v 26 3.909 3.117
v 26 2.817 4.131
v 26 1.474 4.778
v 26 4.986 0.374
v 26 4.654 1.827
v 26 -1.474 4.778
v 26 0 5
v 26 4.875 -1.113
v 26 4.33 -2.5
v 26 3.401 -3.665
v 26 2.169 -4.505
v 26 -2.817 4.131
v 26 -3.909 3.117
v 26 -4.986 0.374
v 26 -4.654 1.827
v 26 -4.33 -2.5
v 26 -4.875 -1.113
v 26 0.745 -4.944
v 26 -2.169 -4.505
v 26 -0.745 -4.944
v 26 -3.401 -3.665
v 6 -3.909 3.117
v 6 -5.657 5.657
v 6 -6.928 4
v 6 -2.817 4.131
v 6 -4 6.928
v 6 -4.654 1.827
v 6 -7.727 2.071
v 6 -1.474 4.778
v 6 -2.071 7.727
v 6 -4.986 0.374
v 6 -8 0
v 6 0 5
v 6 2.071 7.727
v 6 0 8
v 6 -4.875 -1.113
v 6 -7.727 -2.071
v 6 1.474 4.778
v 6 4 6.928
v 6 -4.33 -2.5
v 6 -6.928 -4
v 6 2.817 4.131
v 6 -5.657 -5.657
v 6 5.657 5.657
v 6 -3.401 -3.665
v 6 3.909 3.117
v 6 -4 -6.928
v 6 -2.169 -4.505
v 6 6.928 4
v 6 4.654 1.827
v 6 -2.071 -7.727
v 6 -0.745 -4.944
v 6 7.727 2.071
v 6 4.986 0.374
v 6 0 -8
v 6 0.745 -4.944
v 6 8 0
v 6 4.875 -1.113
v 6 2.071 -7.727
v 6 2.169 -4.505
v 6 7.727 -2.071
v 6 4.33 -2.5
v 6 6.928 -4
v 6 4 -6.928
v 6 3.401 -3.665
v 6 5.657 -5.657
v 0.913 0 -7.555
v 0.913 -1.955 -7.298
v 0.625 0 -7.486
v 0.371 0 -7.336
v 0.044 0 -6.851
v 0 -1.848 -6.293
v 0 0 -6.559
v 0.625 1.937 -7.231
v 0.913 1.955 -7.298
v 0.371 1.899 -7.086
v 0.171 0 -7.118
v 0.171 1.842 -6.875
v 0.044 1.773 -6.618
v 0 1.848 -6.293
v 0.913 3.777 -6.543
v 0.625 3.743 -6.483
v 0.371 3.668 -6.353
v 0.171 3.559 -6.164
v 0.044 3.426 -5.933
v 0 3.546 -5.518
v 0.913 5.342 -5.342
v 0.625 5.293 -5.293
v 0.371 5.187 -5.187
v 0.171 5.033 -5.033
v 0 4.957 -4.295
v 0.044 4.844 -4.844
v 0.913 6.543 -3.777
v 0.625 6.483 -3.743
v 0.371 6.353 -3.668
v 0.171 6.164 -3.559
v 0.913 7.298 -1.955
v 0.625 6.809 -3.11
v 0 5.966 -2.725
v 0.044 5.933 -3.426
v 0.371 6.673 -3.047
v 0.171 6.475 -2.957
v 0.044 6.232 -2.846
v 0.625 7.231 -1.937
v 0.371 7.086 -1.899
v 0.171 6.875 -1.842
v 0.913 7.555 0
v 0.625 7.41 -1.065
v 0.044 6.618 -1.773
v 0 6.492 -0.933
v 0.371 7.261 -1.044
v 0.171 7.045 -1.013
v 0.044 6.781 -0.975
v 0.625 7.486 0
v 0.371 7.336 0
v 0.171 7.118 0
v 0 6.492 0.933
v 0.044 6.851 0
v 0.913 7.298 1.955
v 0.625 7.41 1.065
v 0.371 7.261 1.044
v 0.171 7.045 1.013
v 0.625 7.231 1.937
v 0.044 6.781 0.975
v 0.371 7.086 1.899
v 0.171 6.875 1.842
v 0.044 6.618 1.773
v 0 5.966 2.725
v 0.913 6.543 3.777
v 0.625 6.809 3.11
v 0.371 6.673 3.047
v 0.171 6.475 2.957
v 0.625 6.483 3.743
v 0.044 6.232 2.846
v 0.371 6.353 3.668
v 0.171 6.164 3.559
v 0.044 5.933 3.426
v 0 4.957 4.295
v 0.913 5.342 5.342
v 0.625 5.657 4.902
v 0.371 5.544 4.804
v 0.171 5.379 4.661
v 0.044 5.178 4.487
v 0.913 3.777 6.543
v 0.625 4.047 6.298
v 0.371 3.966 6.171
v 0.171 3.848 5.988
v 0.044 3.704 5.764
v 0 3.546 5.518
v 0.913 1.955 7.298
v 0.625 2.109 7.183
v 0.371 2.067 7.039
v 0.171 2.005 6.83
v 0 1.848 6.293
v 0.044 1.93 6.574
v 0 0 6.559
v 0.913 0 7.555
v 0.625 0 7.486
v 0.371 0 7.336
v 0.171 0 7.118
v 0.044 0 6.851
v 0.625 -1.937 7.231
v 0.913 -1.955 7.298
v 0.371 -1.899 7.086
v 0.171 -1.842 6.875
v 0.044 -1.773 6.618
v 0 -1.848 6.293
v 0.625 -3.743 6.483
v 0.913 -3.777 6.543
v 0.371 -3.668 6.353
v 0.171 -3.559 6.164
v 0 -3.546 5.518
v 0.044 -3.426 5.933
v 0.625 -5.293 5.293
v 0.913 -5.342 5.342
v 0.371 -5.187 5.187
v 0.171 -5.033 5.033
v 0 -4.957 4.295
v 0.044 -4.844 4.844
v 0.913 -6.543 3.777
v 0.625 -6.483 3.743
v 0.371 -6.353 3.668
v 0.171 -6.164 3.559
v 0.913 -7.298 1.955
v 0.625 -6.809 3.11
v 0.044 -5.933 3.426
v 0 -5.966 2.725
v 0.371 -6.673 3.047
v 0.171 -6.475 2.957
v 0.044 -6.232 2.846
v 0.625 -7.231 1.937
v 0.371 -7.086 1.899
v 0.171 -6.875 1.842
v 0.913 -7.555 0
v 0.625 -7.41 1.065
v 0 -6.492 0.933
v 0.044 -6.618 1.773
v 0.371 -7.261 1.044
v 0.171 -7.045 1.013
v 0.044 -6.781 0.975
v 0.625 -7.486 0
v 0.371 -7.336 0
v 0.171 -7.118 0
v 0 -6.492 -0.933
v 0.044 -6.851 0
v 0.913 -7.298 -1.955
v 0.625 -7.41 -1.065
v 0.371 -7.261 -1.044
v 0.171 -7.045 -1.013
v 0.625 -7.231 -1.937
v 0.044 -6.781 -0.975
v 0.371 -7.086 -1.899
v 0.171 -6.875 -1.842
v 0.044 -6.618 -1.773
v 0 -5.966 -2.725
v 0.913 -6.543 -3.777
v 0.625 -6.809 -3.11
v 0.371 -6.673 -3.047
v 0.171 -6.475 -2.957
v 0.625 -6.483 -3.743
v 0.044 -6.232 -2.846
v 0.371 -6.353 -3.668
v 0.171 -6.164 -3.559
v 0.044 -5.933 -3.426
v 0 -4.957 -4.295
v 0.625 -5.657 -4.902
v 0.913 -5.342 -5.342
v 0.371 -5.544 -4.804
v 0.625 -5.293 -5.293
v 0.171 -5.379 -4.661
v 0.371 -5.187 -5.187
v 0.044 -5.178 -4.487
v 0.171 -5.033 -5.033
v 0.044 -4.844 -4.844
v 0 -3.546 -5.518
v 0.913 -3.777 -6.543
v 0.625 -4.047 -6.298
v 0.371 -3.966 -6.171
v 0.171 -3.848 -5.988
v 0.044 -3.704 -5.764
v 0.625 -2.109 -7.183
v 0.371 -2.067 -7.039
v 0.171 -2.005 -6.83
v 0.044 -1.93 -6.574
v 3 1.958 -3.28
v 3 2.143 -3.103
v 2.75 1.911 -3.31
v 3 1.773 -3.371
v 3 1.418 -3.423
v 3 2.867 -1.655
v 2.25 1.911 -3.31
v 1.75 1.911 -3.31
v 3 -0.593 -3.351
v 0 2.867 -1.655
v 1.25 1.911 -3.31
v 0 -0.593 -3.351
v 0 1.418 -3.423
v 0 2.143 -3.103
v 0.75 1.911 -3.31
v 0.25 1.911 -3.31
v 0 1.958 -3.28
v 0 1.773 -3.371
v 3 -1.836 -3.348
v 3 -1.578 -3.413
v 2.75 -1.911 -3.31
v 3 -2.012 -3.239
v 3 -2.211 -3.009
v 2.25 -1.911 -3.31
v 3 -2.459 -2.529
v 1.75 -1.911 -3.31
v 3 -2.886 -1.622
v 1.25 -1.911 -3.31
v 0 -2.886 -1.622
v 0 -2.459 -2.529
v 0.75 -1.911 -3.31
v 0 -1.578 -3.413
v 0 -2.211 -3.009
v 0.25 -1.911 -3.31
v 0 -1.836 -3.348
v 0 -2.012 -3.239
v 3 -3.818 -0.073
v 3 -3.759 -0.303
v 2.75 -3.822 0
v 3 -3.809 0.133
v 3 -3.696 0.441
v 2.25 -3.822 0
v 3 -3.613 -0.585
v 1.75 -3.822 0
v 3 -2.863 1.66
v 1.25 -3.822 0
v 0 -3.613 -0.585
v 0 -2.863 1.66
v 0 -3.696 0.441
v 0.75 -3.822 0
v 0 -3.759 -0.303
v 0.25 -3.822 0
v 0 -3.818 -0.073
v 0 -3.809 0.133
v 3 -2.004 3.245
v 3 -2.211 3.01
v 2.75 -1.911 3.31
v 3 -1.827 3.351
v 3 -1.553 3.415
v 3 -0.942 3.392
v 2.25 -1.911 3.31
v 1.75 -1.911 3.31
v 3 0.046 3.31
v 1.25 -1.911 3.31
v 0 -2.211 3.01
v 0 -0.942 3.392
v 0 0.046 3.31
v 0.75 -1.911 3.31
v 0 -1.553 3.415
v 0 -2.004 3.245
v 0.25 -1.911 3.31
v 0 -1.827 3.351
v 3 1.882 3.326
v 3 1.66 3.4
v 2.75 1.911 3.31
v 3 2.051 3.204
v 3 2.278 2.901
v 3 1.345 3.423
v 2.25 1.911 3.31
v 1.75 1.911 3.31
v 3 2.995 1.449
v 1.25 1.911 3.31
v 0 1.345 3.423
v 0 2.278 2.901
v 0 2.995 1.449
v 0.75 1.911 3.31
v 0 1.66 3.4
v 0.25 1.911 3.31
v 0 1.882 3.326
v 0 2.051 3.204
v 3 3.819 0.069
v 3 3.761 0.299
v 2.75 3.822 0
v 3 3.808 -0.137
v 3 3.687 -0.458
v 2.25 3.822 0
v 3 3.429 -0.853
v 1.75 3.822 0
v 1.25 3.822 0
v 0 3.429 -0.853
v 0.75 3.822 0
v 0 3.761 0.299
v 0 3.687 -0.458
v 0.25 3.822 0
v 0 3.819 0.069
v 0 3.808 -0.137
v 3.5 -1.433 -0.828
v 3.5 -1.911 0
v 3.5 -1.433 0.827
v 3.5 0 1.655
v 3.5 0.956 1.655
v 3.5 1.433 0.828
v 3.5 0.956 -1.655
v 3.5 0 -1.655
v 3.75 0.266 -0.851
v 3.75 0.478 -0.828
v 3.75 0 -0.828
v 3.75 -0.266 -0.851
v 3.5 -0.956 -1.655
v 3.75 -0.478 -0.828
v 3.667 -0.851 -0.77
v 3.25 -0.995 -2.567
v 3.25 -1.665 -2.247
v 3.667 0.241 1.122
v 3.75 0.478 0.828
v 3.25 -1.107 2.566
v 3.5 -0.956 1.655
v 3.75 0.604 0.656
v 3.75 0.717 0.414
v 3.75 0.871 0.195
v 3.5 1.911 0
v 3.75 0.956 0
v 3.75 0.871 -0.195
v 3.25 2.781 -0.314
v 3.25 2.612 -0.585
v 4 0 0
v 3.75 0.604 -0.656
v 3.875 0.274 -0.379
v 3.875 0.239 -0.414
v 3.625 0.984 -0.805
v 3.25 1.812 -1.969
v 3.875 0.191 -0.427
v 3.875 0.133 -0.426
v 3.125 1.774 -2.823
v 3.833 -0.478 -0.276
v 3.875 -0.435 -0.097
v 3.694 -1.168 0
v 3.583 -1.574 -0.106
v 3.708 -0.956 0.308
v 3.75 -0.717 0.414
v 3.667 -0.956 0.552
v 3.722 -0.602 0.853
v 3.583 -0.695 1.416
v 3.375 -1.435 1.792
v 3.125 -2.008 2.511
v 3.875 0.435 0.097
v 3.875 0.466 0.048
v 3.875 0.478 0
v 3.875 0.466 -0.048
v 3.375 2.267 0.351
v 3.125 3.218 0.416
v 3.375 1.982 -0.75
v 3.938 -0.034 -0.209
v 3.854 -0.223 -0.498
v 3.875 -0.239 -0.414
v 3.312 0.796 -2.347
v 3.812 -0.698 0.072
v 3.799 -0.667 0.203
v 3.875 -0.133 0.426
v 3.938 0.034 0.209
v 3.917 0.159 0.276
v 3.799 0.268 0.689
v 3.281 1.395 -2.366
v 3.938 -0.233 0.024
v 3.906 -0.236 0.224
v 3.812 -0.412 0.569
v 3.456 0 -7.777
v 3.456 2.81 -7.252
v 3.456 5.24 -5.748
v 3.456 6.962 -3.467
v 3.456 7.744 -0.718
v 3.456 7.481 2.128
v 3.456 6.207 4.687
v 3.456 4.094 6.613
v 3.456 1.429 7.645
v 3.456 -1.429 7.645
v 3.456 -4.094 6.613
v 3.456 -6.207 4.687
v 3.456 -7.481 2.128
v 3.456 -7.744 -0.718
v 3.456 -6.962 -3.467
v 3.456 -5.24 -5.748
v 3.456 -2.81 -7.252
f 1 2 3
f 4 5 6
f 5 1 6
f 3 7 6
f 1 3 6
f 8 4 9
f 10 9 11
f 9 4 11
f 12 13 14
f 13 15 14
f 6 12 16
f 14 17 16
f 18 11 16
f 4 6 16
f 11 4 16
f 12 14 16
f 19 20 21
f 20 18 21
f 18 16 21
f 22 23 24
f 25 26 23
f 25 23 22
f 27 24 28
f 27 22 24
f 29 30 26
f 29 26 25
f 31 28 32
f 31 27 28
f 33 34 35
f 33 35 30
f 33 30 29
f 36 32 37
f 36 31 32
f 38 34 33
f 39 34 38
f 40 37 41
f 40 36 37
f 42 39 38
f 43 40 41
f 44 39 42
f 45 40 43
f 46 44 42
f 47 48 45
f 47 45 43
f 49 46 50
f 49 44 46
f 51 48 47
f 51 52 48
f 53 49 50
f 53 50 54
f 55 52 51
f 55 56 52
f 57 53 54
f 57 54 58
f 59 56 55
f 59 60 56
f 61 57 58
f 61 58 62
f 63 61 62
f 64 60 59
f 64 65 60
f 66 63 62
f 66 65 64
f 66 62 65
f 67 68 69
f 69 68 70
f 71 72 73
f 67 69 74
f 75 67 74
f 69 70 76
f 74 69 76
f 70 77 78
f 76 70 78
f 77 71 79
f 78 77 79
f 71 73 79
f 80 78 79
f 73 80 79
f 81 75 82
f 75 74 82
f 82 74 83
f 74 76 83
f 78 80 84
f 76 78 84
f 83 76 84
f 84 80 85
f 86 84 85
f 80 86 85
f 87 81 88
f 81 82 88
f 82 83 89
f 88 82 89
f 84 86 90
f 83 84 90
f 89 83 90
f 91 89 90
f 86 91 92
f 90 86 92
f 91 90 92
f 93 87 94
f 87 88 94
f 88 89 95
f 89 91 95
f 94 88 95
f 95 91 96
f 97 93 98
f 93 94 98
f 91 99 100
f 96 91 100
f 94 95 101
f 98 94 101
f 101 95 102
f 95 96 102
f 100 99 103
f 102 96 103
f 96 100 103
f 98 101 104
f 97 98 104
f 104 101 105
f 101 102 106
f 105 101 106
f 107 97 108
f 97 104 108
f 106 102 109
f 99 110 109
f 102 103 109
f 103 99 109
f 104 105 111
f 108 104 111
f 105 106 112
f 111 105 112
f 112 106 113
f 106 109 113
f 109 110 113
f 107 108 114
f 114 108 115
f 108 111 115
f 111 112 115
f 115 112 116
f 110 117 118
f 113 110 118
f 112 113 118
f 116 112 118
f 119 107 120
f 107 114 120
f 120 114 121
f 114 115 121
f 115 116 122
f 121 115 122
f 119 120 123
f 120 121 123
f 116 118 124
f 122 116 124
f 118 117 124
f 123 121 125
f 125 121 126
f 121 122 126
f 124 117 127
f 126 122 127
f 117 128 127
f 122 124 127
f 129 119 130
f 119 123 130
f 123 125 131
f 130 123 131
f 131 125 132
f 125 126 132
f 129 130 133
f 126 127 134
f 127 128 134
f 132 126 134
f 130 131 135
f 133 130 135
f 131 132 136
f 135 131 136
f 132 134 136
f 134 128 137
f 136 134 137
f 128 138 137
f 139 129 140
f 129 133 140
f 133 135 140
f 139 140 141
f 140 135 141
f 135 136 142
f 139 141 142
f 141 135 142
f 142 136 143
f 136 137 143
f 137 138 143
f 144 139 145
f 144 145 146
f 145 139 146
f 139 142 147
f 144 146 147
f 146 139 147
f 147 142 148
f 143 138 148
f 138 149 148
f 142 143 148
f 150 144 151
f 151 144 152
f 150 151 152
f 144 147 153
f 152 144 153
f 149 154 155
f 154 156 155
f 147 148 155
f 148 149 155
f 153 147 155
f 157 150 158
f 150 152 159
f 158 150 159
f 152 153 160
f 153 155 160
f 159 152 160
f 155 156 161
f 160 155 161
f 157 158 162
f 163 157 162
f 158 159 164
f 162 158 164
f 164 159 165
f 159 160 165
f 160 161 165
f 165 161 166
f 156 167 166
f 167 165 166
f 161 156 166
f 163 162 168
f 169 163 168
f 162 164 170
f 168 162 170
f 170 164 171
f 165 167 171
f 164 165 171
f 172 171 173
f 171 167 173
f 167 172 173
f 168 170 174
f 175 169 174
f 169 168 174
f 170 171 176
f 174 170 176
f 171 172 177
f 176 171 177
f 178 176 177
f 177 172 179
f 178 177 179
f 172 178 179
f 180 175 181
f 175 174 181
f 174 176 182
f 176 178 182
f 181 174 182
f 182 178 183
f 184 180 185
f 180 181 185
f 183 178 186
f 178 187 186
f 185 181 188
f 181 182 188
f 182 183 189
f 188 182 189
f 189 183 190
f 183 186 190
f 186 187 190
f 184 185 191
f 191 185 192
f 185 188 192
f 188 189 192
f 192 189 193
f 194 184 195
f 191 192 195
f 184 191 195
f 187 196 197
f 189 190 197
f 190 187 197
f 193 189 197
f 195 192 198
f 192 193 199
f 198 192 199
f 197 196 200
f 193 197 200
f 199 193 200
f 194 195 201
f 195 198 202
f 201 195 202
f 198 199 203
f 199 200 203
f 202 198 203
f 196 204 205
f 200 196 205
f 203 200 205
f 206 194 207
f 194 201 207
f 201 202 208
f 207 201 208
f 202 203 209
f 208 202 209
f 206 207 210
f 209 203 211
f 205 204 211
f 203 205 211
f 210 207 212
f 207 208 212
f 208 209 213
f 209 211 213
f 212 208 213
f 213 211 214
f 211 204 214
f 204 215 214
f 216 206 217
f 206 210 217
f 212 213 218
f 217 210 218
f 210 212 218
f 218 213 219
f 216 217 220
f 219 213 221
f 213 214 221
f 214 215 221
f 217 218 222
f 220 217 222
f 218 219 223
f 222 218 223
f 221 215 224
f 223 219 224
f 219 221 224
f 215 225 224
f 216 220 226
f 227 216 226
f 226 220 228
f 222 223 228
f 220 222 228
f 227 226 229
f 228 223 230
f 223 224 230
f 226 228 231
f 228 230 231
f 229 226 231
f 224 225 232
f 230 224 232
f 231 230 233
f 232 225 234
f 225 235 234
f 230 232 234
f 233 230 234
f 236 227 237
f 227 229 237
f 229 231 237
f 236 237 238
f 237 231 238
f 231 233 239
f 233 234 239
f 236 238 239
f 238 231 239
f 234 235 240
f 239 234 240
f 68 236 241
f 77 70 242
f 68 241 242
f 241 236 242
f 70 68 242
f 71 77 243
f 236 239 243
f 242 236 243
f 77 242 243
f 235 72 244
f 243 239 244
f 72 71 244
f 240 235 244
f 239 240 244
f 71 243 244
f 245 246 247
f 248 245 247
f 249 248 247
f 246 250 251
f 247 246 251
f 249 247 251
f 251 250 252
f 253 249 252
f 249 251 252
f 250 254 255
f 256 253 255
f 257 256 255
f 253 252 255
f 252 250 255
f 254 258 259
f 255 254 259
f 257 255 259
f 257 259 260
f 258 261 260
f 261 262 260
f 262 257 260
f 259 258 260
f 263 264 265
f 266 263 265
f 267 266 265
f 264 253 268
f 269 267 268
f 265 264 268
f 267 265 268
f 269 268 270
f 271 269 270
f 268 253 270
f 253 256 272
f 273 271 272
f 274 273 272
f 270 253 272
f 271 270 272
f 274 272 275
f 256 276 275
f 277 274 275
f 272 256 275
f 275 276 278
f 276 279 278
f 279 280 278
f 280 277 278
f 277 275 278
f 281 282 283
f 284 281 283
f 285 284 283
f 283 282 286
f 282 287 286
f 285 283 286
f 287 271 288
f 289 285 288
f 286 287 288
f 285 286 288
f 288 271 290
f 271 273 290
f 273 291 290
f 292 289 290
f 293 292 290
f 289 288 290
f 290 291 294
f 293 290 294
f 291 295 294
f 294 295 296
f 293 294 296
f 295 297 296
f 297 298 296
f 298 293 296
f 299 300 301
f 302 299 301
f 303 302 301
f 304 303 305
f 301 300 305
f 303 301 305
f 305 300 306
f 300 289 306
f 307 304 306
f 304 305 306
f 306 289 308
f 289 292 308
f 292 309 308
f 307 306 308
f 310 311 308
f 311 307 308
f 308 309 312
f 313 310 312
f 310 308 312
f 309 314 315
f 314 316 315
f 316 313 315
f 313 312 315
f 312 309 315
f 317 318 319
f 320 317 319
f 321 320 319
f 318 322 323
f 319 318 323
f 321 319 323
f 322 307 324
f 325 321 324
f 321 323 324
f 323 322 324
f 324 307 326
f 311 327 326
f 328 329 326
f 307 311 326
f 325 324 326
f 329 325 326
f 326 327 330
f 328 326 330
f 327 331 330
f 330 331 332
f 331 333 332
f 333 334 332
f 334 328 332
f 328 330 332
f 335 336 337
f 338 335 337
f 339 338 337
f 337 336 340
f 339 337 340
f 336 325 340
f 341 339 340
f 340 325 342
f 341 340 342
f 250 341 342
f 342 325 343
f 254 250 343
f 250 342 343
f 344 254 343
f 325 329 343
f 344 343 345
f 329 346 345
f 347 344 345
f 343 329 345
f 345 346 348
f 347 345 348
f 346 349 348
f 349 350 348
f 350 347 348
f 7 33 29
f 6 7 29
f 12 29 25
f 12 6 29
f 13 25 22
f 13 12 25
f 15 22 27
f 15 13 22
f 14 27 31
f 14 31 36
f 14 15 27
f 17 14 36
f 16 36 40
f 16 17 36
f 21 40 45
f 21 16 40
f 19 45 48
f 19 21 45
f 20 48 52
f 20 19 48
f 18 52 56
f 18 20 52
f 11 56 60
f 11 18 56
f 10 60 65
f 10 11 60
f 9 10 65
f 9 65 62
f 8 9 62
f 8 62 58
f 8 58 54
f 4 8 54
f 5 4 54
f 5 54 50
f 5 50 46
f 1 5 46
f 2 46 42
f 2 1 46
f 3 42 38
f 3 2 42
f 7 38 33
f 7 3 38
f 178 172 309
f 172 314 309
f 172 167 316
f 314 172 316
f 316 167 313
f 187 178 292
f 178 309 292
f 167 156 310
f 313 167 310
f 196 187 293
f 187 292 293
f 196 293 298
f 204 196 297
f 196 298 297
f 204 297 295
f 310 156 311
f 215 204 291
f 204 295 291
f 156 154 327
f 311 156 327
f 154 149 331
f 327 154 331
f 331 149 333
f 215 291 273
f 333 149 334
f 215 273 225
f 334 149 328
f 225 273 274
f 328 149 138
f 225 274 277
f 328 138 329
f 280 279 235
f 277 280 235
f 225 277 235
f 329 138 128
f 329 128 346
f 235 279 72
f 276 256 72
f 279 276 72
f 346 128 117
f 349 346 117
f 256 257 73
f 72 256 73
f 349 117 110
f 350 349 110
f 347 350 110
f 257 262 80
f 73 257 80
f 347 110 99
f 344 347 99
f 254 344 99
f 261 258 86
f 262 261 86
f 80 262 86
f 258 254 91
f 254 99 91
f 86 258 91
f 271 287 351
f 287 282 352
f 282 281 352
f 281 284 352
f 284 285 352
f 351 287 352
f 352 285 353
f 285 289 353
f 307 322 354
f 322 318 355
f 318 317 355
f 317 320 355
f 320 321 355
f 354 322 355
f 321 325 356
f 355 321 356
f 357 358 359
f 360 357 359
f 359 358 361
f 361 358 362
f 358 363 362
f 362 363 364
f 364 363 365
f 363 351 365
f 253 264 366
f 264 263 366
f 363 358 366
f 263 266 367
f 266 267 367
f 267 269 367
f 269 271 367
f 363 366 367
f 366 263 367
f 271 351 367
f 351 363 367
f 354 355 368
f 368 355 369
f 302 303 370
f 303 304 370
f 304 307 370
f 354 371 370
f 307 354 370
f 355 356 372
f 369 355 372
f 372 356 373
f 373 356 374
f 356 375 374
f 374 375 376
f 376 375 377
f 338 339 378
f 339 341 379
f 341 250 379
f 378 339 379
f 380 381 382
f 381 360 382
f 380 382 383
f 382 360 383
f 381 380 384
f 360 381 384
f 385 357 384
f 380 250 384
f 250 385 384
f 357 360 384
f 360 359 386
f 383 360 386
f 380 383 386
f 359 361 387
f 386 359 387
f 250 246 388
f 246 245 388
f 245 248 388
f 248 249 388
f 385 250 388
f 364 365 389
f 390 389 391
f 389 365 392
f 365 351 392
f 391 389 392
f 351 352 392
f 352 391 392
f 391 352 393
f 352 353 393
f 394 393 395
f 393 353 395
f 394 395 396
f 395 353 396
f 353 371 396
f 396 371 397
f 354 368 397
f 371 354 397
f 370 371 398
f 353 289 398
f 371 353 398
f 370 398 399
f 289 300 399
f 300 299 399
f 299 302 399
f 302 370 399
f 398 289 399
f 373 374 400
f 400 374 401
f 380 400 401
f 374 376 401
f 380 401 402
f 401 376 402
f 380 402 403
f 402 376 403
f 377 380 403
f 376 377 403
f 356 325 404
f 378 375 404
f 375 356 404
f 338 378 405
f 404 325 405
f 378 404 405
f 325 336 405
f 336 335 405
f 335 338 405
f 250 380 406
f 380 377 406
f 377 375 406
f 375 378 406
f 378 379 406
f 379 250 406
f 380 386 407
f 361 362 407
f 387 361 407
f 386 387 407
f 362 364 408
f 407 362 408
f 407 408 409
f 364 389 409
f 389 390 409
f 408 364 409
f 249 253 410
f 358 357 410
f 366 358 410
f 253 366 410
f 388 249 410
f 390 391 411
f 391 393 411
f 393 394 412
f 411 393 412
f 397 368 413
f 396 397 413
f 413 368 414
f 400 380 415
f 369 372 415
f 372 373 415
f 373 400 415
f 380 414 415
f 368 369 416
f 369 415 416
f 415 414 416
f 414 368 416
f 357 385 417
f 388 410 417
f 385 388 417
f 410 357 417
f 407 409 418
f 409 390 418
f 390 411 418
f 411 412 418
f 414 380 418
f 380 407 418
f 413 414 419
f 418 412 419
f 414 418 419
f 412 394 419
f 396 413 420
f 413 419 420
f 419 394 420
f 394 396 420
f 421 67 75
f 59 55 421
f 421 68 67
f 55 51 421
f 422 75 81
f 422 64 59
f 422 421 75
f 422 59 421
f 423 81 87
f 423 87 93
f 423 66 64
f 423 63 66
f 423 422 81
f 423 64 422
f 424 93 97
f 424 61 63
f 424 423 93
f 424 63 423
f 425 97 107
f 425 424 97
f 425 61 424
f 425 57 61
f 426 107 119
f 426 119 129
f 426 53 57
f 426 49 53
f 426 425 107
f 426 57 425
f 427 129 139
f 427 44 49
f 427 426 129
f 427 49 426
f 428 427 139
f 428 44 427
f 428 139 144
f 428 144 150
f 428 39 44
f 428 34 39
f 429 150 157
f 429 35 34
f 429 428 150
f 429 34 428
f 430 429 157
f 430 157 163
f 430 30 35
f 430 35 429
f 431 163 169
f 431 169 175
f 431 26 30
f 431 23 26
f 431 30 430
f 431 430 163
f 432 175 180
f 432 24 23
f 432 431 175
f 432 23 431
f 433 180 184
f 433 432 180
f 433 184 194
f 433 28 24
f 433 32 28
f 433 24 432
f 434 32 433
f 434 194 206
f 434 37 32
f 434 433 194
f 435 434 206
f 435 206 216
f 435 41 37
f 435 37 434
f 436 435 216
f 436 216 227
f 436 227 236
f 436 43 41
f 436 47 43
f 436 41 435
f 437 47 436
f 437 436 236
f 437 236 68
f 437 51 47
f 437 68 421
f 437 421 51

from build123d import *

# Parameters (mm, degrees)
SKETCH1_R      = 8
BASEHEAD_DEPTH = 6
BASEHEAD_DRAFT = -5
SKETCH8_W      = 20
SKETCH8_H      = 5
SOCKET_DEPTH   = 3
HEADFILLET2_R  = 1


with BuildPart() as part:
    # Sketch1 → BaseHead (with draft: the straight prism first)
    with BuildSketch(Plane(origin=(6, 0, 0), x_dir=(0, 0, -1), z_dir=(1, 0, 0))):
        Circle(SKETCH1_R)
    extrude(amount=-BASEHEAD_DEPTH)
    # BaseHead: the draft: its side faces are tilted about the plane it starts from
    basehead_sides = [part.faces().sort_by_distance(p)[0] for p in [
        (3, 0, 8),
    ]]
    draft(basehead_sides, Plane(origin=(6, 0, 0), x_dir=(0, 0, -1), z_dir=(1, 0, 0)), BASEHEAD_DRAFT)

    # Sketch8 → Revolve1 (revolve)
    with BuildSketch(Plane.XY, mode=Mode.PRIVATE) as revolve1_sk:
        with Locations((16, 2.5)):
            Rectangle(SKETCH8_W, SKETCH8_H)
    revolve(revolve1_sk.sketch.rotate(Axis((0, 0, 0), (1, 0, 0)), 90), axis=Axis((0, 0, 0), (1, 0, 0)))

    # Sketch4 → Socket (cut)
    with BuildSketch(Plane(origin=(0, 0, 0), x_dir=(0, 0, -1), z_dir=(1, 0, 0))):
        with BuildLine():
            add(Edge.make_bspline(
                [(1.655, 2.866544087), (2.291538462, 2.499038434), (3.819230769, 2.205033913), (3.055384615, 0), (3.819230769, -2.205033913), (1.527692308, -2.646040695), (0, -4.410067825), (-1.527692308, -2.646040695), (-3.819230769, -2.205033913), (-3.055384615, 0), (-3.819230769, 2.205033913), (-1.527692308, 2.646040695), (0, 4.410067825), (1.018461538, 3.234049739), (1.655, 2.866544087)],
                knots=[0, 0, 0, 0, 0.083333333, 0.166666667, 0.25, 0.333333333, 0.416666667, 0.5, 0.583333333, 0.666666667, 0.75, 0.833333333, 0.916666667, 1, 1, 1, 1], degree=3))
        make_face()
    extrude(amount=SOCKET_DEPTH, mode=Mode.SUBTRACT)

    # Sketch5 → Cut-Loft1 section 0
    with BuildSketch(Plane.ZY.offset(-3), mode=Mode.PRIVATE) as cut_loft1_s0:
        with BuildLine():
            add(Edge.make_bspline(
                [(-1.655, 2.866544087), (-2.291538462, 2.499038434), (-3.819230769, 2.205033913), (-3.055384615, 0), (-3.819230769, -2.205033913), (-1.527692308, -2.646040695), (0, -4.410067825), (1.527692308, -2.646040695), (3.819230769, -2.205033913), (3.055384615, 0), (3.819230769, 2.205033913), (1.527692308, 2.646040695), (0, 4.410067825), (-1.018461538, 3.234049739), (-1.655, 2.866544087)],
                knots=[0, 0, 0, 0, 0.083333333, 0.166666667, 0.25, 0.333333333, 0.416666667, 0.5, 0.583333333, 0.666666667, 0.75, 0.833333333, 0.916666667, 1, 1, 1, 1], degree=3))
        make_face()
    loft([Vertex(4, 0, 0), cut_loft1_s0.sketch], mode=Mode.SUBTRACT)

    # HeadFillet2
    headfillet2_edges = [part.edges().sort_by_distance(p)[0] for p in [
        (0, 0, 7.475068019),
    ]]
    fillet(headfillet2_edges, radius=HEADFILLET2_R)


solid = part.part
